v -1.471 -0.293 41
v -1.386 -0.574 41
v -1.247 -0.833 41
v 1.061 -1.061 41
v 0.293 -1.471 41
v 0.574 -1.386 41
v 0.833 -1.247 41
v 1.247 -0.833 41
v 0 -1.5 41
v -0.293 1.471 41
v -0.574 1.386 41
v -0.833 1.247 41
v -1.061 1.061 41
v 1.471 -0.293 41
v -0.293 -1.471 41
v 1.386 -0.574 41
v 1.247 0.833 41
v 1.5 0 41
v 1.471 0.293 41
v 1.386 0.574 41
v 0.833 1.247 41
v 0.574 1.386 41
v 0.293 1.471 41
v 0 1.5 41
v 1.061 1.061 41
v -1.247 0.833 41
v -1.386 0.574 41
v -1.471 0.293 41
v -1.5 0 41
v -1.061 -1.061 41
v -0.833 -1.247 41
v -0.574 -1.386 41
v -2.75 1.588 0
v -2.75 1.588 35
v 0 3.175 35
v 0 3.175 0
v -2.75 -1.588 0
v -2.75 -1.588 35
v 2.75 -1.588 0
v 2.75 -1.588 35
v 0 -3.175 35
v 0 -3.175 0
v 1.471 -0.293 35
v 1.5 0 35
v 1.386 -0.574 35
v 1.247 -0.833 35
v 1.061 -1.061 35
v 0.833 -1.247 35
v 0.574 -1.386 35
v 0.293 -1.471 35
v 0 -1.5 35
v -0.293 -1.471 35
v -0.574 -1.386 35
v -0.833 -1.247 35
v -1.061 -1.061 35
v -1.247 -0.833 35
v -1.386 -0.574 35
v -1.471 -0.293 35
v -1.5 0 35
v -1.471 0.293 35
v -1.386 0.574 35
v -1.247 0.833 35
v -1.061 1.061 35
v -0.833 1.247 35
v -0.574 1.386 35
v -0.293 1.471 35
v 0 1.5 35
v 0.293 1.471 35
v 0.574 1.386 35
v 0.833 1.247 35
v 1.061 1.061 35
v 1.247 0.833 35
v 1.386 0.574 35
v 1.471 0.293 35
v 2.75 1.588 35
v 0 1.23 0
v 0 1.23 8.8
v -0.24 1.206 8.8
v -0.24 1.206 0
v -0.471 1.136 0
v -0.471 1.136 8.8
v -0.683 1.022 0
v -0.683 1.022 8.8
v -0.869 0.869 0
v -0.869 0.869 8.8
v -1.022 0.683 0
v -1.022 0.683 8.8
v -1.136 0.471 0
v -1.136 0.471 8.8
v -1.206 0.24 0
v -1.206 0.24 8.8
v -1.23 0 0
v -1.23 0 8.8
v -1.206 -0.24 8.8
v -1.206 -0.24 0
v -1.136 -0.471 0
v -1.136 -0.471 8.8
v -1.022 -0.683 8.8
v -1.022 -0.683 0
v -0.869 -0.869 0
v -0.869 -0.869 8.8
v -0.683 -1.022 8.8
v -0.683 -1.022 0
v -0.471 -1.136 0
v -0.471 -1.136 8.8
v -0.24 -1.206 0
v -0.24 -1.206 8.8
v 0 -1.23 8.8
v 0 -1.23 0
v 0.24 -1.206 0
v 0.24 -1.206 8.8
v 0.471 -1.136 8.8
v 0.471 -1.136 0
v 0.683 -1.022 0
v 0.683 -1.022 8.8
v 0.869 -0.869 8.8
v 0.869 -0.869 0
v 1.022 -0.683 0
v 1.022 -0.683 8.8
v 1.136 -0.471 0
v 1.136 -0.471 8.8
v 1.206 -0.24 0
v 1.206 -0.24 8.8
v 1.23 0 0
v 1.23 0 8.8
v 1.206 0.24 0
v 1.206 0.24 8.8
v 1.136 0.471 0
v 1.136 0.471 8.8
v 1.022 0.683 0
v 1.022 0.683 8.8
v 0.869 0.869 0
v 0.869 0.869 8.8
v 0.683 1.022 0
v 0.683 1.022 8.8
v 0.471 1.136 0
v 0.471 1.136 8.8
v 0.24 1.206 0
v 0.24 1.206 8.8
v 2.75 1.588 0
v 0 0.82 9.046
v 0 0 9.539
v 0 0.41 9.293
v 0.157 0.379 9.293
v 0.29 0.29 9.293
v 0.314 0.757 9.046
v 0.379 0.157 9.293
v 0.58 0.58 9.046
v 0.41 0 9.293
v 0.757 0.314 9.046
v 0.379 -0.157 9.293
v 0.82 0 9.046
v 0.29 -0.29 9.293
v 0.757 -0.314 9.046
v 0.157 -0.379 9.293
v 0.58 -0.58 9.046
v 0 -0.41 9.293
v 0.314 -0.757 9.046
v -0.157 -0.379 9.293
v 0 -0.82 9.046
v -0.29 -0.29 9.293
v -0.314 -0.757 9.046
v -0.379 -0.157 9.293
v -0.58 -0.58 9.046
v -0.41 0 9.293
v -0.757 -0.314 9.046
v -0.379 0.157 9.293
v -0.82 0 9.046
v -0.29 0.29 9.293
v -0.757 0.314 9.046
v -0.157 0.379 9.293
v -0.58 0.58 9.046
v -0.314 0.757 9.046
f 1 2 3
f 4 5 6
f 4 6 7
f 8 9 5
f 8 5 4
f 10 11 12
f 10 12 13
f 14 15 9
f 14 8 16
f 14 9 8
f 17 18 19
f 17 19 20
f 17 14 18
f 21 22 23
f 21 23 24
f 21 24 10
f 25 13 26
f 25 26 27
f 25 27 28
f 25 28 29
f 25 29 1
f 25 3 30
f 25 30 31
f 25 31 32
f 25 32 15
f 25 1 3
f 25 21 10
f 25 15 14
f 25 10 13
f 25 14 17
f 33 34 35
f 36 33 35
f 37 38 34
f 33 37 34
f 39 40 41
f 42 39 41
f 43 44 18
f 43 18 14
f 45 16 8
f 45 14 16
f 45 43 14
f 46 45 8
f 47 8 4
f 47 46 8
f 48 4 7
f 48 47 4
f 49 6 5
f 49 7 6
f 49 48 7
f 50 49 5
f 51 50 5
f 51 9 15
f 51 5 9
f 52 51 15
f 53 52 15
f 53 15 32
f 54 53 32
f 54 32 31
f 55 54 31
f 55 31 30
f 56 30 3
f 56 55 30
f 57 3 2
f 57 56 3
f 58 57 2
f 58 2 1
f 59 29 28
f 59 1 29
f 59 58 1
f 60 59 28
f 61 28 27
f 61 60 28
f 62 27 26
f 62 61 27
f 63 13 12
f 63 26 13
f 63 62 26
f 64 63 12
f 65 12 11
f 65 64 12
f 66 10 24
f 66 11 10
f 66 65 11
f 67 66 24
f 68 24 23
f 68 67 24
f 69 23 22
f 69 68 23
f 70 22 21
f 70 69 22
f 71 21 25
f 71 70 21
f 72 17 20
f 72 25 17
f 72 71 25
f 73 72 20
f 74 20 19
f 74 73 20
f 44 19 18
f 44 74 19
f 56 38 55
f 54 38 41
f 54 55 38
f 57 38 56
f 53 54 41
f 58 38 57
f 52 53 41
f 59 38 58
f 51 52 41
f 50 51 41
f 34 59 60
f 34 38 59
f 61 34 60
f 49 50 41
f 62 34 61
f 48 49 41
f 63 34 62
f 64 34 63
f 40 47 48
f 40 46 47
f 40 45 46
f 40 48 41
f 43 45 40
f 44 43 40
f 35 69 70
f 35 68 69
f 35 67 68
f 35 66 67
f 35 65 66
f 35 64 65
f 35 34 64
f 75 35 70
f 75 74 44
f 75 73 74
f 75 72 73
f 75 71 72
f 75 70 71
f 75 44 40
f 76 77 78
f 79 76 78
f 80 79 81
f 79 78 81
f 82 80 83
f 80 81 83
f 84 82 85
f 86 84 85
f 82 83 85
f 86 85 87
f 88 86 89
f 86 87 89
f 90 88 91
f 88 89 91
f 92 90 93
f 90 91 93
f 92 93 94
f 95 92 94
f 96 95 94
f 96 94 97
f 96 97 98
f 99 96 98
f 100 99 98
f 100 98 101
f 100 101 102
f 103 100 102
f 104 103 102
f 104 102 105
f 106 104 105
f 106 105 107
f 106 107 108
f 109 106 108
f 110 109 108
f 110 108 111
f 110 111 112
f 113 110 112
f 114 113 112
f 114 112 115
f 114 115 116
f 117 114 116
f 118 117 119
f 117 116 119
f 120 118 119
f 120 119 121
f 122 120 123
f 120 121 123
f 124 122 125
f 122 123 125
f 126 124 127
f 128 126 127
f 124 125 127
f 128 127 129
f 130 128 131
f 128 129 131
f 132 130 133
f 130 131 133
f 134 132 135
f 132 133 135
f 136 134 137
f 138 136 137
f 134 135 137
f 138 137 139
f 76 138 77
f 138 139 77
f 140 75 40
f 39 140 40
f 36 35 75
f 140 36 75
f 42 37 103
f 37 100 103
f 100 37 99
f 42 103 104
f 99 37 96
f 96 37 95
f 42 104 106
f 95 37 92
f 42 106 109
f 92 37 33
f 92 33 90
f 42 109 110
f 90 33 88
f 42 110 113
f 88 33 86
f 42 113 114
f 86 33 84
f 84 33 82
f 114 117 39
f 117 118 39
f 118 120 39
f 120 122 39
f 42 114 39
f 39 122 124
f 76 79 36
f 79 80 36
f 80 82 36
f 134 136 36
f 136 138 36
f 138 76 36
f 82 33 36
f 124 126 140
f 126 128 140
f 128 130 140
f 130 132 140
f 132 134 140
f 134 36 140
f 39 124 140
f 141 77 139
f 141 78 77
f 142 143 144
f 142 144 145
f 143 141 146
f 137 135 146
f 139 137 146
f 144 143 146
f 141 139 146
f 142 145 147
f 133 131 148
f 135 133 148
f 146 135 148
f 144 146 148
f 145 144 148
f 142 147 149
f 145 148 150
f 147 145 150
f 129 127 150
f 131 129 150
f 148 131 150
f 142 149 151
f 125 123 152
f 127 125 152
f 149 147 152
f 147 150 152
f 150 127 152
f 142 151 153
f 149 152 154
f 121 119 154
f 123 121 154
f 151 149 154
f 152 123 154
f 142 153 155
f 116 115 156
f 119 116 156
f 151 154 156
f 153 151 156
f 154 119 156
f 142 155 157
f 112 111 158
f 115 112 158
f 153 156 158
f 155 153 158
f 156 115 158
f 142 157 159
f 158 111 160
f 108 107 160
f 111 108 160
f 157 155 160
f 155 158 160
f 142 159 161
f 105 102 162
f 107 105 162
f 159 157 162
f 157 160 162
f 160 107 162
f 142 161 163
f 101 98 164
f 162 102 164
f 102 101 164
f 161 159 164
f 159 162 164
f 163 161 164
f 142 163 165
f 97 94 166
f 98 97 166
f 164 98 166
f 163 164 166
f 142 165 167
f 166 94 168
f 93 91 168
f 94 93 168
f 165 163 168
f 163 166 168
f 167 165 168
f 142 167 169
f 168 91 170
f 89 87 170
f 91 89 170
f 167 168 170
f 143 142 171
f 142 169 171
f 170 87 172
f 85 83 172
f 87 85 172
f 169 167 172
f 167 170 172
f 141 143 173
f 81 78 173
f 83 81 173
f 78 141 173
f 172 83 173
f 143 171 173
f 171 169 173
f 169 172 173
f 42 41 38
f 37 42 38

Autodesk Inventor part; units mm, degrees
ref_plane "YZ Plane" through (0, 0, 0) normal (1, 0, 0) x (0, 1, 0)
ref_plane "XZ Plane" through (0, 0, 0) normal (0, 1, 0) x (-1, 0, 0)
ref_plane "XY Plane" through (0, 0, 0) normal (0, 0, 1) x (1, 0, 0)
sketch "スケッチ1" plane through (0, 0, 0) normal (0, 0, 1) x (1, 0, 0)
  line L0 (0, 3.1754) -> (2.75, 1.5877)
  line L1 (2.75, 1.5877) -> (2.75, -1.5877)
  line L2 (2.75, -1.5877) -> (0, -3.1754)
  line L3 (0, -3.1754) -> (-2.75, -1.5877)
  line L4 (-2.75, -1.5877) -> (-2.75, 1.5877)
  line L5 (-2.75, 1.5877) -> (0, 3.1754)
  point P0 (0, 0)
  point P1 (0, 0)
  dimension "d0" = 5.5
extrude "押し出し1" add sketch "スケッチ1" along normal blind 35
sketch "スケッチ2" plane through (0, 0, 35) normal (0, 0, 1) x (1, 0, 0)
  circle A0 centre (0, 0) radius 1.5
  dimension "d3" = 3
extrude "押し出し2" add sketch "スケッチ2" along normal blind 6
sketch "スケッチ3" plane through (0, 0, 0) normal (0, 0, -1) x (-1, 0, 0)
  point P0 (0, 0)
hole "穴1" at (0, 0, 0) direction (0, 0, 1) diameter 2.459 depth 8.8 tip angle 118 thread size "M3x0.5" class "6H" standard "ISO Metric profile"
properties part number "SBD-O3-25" material "真鍮、ソフト イエロー"
